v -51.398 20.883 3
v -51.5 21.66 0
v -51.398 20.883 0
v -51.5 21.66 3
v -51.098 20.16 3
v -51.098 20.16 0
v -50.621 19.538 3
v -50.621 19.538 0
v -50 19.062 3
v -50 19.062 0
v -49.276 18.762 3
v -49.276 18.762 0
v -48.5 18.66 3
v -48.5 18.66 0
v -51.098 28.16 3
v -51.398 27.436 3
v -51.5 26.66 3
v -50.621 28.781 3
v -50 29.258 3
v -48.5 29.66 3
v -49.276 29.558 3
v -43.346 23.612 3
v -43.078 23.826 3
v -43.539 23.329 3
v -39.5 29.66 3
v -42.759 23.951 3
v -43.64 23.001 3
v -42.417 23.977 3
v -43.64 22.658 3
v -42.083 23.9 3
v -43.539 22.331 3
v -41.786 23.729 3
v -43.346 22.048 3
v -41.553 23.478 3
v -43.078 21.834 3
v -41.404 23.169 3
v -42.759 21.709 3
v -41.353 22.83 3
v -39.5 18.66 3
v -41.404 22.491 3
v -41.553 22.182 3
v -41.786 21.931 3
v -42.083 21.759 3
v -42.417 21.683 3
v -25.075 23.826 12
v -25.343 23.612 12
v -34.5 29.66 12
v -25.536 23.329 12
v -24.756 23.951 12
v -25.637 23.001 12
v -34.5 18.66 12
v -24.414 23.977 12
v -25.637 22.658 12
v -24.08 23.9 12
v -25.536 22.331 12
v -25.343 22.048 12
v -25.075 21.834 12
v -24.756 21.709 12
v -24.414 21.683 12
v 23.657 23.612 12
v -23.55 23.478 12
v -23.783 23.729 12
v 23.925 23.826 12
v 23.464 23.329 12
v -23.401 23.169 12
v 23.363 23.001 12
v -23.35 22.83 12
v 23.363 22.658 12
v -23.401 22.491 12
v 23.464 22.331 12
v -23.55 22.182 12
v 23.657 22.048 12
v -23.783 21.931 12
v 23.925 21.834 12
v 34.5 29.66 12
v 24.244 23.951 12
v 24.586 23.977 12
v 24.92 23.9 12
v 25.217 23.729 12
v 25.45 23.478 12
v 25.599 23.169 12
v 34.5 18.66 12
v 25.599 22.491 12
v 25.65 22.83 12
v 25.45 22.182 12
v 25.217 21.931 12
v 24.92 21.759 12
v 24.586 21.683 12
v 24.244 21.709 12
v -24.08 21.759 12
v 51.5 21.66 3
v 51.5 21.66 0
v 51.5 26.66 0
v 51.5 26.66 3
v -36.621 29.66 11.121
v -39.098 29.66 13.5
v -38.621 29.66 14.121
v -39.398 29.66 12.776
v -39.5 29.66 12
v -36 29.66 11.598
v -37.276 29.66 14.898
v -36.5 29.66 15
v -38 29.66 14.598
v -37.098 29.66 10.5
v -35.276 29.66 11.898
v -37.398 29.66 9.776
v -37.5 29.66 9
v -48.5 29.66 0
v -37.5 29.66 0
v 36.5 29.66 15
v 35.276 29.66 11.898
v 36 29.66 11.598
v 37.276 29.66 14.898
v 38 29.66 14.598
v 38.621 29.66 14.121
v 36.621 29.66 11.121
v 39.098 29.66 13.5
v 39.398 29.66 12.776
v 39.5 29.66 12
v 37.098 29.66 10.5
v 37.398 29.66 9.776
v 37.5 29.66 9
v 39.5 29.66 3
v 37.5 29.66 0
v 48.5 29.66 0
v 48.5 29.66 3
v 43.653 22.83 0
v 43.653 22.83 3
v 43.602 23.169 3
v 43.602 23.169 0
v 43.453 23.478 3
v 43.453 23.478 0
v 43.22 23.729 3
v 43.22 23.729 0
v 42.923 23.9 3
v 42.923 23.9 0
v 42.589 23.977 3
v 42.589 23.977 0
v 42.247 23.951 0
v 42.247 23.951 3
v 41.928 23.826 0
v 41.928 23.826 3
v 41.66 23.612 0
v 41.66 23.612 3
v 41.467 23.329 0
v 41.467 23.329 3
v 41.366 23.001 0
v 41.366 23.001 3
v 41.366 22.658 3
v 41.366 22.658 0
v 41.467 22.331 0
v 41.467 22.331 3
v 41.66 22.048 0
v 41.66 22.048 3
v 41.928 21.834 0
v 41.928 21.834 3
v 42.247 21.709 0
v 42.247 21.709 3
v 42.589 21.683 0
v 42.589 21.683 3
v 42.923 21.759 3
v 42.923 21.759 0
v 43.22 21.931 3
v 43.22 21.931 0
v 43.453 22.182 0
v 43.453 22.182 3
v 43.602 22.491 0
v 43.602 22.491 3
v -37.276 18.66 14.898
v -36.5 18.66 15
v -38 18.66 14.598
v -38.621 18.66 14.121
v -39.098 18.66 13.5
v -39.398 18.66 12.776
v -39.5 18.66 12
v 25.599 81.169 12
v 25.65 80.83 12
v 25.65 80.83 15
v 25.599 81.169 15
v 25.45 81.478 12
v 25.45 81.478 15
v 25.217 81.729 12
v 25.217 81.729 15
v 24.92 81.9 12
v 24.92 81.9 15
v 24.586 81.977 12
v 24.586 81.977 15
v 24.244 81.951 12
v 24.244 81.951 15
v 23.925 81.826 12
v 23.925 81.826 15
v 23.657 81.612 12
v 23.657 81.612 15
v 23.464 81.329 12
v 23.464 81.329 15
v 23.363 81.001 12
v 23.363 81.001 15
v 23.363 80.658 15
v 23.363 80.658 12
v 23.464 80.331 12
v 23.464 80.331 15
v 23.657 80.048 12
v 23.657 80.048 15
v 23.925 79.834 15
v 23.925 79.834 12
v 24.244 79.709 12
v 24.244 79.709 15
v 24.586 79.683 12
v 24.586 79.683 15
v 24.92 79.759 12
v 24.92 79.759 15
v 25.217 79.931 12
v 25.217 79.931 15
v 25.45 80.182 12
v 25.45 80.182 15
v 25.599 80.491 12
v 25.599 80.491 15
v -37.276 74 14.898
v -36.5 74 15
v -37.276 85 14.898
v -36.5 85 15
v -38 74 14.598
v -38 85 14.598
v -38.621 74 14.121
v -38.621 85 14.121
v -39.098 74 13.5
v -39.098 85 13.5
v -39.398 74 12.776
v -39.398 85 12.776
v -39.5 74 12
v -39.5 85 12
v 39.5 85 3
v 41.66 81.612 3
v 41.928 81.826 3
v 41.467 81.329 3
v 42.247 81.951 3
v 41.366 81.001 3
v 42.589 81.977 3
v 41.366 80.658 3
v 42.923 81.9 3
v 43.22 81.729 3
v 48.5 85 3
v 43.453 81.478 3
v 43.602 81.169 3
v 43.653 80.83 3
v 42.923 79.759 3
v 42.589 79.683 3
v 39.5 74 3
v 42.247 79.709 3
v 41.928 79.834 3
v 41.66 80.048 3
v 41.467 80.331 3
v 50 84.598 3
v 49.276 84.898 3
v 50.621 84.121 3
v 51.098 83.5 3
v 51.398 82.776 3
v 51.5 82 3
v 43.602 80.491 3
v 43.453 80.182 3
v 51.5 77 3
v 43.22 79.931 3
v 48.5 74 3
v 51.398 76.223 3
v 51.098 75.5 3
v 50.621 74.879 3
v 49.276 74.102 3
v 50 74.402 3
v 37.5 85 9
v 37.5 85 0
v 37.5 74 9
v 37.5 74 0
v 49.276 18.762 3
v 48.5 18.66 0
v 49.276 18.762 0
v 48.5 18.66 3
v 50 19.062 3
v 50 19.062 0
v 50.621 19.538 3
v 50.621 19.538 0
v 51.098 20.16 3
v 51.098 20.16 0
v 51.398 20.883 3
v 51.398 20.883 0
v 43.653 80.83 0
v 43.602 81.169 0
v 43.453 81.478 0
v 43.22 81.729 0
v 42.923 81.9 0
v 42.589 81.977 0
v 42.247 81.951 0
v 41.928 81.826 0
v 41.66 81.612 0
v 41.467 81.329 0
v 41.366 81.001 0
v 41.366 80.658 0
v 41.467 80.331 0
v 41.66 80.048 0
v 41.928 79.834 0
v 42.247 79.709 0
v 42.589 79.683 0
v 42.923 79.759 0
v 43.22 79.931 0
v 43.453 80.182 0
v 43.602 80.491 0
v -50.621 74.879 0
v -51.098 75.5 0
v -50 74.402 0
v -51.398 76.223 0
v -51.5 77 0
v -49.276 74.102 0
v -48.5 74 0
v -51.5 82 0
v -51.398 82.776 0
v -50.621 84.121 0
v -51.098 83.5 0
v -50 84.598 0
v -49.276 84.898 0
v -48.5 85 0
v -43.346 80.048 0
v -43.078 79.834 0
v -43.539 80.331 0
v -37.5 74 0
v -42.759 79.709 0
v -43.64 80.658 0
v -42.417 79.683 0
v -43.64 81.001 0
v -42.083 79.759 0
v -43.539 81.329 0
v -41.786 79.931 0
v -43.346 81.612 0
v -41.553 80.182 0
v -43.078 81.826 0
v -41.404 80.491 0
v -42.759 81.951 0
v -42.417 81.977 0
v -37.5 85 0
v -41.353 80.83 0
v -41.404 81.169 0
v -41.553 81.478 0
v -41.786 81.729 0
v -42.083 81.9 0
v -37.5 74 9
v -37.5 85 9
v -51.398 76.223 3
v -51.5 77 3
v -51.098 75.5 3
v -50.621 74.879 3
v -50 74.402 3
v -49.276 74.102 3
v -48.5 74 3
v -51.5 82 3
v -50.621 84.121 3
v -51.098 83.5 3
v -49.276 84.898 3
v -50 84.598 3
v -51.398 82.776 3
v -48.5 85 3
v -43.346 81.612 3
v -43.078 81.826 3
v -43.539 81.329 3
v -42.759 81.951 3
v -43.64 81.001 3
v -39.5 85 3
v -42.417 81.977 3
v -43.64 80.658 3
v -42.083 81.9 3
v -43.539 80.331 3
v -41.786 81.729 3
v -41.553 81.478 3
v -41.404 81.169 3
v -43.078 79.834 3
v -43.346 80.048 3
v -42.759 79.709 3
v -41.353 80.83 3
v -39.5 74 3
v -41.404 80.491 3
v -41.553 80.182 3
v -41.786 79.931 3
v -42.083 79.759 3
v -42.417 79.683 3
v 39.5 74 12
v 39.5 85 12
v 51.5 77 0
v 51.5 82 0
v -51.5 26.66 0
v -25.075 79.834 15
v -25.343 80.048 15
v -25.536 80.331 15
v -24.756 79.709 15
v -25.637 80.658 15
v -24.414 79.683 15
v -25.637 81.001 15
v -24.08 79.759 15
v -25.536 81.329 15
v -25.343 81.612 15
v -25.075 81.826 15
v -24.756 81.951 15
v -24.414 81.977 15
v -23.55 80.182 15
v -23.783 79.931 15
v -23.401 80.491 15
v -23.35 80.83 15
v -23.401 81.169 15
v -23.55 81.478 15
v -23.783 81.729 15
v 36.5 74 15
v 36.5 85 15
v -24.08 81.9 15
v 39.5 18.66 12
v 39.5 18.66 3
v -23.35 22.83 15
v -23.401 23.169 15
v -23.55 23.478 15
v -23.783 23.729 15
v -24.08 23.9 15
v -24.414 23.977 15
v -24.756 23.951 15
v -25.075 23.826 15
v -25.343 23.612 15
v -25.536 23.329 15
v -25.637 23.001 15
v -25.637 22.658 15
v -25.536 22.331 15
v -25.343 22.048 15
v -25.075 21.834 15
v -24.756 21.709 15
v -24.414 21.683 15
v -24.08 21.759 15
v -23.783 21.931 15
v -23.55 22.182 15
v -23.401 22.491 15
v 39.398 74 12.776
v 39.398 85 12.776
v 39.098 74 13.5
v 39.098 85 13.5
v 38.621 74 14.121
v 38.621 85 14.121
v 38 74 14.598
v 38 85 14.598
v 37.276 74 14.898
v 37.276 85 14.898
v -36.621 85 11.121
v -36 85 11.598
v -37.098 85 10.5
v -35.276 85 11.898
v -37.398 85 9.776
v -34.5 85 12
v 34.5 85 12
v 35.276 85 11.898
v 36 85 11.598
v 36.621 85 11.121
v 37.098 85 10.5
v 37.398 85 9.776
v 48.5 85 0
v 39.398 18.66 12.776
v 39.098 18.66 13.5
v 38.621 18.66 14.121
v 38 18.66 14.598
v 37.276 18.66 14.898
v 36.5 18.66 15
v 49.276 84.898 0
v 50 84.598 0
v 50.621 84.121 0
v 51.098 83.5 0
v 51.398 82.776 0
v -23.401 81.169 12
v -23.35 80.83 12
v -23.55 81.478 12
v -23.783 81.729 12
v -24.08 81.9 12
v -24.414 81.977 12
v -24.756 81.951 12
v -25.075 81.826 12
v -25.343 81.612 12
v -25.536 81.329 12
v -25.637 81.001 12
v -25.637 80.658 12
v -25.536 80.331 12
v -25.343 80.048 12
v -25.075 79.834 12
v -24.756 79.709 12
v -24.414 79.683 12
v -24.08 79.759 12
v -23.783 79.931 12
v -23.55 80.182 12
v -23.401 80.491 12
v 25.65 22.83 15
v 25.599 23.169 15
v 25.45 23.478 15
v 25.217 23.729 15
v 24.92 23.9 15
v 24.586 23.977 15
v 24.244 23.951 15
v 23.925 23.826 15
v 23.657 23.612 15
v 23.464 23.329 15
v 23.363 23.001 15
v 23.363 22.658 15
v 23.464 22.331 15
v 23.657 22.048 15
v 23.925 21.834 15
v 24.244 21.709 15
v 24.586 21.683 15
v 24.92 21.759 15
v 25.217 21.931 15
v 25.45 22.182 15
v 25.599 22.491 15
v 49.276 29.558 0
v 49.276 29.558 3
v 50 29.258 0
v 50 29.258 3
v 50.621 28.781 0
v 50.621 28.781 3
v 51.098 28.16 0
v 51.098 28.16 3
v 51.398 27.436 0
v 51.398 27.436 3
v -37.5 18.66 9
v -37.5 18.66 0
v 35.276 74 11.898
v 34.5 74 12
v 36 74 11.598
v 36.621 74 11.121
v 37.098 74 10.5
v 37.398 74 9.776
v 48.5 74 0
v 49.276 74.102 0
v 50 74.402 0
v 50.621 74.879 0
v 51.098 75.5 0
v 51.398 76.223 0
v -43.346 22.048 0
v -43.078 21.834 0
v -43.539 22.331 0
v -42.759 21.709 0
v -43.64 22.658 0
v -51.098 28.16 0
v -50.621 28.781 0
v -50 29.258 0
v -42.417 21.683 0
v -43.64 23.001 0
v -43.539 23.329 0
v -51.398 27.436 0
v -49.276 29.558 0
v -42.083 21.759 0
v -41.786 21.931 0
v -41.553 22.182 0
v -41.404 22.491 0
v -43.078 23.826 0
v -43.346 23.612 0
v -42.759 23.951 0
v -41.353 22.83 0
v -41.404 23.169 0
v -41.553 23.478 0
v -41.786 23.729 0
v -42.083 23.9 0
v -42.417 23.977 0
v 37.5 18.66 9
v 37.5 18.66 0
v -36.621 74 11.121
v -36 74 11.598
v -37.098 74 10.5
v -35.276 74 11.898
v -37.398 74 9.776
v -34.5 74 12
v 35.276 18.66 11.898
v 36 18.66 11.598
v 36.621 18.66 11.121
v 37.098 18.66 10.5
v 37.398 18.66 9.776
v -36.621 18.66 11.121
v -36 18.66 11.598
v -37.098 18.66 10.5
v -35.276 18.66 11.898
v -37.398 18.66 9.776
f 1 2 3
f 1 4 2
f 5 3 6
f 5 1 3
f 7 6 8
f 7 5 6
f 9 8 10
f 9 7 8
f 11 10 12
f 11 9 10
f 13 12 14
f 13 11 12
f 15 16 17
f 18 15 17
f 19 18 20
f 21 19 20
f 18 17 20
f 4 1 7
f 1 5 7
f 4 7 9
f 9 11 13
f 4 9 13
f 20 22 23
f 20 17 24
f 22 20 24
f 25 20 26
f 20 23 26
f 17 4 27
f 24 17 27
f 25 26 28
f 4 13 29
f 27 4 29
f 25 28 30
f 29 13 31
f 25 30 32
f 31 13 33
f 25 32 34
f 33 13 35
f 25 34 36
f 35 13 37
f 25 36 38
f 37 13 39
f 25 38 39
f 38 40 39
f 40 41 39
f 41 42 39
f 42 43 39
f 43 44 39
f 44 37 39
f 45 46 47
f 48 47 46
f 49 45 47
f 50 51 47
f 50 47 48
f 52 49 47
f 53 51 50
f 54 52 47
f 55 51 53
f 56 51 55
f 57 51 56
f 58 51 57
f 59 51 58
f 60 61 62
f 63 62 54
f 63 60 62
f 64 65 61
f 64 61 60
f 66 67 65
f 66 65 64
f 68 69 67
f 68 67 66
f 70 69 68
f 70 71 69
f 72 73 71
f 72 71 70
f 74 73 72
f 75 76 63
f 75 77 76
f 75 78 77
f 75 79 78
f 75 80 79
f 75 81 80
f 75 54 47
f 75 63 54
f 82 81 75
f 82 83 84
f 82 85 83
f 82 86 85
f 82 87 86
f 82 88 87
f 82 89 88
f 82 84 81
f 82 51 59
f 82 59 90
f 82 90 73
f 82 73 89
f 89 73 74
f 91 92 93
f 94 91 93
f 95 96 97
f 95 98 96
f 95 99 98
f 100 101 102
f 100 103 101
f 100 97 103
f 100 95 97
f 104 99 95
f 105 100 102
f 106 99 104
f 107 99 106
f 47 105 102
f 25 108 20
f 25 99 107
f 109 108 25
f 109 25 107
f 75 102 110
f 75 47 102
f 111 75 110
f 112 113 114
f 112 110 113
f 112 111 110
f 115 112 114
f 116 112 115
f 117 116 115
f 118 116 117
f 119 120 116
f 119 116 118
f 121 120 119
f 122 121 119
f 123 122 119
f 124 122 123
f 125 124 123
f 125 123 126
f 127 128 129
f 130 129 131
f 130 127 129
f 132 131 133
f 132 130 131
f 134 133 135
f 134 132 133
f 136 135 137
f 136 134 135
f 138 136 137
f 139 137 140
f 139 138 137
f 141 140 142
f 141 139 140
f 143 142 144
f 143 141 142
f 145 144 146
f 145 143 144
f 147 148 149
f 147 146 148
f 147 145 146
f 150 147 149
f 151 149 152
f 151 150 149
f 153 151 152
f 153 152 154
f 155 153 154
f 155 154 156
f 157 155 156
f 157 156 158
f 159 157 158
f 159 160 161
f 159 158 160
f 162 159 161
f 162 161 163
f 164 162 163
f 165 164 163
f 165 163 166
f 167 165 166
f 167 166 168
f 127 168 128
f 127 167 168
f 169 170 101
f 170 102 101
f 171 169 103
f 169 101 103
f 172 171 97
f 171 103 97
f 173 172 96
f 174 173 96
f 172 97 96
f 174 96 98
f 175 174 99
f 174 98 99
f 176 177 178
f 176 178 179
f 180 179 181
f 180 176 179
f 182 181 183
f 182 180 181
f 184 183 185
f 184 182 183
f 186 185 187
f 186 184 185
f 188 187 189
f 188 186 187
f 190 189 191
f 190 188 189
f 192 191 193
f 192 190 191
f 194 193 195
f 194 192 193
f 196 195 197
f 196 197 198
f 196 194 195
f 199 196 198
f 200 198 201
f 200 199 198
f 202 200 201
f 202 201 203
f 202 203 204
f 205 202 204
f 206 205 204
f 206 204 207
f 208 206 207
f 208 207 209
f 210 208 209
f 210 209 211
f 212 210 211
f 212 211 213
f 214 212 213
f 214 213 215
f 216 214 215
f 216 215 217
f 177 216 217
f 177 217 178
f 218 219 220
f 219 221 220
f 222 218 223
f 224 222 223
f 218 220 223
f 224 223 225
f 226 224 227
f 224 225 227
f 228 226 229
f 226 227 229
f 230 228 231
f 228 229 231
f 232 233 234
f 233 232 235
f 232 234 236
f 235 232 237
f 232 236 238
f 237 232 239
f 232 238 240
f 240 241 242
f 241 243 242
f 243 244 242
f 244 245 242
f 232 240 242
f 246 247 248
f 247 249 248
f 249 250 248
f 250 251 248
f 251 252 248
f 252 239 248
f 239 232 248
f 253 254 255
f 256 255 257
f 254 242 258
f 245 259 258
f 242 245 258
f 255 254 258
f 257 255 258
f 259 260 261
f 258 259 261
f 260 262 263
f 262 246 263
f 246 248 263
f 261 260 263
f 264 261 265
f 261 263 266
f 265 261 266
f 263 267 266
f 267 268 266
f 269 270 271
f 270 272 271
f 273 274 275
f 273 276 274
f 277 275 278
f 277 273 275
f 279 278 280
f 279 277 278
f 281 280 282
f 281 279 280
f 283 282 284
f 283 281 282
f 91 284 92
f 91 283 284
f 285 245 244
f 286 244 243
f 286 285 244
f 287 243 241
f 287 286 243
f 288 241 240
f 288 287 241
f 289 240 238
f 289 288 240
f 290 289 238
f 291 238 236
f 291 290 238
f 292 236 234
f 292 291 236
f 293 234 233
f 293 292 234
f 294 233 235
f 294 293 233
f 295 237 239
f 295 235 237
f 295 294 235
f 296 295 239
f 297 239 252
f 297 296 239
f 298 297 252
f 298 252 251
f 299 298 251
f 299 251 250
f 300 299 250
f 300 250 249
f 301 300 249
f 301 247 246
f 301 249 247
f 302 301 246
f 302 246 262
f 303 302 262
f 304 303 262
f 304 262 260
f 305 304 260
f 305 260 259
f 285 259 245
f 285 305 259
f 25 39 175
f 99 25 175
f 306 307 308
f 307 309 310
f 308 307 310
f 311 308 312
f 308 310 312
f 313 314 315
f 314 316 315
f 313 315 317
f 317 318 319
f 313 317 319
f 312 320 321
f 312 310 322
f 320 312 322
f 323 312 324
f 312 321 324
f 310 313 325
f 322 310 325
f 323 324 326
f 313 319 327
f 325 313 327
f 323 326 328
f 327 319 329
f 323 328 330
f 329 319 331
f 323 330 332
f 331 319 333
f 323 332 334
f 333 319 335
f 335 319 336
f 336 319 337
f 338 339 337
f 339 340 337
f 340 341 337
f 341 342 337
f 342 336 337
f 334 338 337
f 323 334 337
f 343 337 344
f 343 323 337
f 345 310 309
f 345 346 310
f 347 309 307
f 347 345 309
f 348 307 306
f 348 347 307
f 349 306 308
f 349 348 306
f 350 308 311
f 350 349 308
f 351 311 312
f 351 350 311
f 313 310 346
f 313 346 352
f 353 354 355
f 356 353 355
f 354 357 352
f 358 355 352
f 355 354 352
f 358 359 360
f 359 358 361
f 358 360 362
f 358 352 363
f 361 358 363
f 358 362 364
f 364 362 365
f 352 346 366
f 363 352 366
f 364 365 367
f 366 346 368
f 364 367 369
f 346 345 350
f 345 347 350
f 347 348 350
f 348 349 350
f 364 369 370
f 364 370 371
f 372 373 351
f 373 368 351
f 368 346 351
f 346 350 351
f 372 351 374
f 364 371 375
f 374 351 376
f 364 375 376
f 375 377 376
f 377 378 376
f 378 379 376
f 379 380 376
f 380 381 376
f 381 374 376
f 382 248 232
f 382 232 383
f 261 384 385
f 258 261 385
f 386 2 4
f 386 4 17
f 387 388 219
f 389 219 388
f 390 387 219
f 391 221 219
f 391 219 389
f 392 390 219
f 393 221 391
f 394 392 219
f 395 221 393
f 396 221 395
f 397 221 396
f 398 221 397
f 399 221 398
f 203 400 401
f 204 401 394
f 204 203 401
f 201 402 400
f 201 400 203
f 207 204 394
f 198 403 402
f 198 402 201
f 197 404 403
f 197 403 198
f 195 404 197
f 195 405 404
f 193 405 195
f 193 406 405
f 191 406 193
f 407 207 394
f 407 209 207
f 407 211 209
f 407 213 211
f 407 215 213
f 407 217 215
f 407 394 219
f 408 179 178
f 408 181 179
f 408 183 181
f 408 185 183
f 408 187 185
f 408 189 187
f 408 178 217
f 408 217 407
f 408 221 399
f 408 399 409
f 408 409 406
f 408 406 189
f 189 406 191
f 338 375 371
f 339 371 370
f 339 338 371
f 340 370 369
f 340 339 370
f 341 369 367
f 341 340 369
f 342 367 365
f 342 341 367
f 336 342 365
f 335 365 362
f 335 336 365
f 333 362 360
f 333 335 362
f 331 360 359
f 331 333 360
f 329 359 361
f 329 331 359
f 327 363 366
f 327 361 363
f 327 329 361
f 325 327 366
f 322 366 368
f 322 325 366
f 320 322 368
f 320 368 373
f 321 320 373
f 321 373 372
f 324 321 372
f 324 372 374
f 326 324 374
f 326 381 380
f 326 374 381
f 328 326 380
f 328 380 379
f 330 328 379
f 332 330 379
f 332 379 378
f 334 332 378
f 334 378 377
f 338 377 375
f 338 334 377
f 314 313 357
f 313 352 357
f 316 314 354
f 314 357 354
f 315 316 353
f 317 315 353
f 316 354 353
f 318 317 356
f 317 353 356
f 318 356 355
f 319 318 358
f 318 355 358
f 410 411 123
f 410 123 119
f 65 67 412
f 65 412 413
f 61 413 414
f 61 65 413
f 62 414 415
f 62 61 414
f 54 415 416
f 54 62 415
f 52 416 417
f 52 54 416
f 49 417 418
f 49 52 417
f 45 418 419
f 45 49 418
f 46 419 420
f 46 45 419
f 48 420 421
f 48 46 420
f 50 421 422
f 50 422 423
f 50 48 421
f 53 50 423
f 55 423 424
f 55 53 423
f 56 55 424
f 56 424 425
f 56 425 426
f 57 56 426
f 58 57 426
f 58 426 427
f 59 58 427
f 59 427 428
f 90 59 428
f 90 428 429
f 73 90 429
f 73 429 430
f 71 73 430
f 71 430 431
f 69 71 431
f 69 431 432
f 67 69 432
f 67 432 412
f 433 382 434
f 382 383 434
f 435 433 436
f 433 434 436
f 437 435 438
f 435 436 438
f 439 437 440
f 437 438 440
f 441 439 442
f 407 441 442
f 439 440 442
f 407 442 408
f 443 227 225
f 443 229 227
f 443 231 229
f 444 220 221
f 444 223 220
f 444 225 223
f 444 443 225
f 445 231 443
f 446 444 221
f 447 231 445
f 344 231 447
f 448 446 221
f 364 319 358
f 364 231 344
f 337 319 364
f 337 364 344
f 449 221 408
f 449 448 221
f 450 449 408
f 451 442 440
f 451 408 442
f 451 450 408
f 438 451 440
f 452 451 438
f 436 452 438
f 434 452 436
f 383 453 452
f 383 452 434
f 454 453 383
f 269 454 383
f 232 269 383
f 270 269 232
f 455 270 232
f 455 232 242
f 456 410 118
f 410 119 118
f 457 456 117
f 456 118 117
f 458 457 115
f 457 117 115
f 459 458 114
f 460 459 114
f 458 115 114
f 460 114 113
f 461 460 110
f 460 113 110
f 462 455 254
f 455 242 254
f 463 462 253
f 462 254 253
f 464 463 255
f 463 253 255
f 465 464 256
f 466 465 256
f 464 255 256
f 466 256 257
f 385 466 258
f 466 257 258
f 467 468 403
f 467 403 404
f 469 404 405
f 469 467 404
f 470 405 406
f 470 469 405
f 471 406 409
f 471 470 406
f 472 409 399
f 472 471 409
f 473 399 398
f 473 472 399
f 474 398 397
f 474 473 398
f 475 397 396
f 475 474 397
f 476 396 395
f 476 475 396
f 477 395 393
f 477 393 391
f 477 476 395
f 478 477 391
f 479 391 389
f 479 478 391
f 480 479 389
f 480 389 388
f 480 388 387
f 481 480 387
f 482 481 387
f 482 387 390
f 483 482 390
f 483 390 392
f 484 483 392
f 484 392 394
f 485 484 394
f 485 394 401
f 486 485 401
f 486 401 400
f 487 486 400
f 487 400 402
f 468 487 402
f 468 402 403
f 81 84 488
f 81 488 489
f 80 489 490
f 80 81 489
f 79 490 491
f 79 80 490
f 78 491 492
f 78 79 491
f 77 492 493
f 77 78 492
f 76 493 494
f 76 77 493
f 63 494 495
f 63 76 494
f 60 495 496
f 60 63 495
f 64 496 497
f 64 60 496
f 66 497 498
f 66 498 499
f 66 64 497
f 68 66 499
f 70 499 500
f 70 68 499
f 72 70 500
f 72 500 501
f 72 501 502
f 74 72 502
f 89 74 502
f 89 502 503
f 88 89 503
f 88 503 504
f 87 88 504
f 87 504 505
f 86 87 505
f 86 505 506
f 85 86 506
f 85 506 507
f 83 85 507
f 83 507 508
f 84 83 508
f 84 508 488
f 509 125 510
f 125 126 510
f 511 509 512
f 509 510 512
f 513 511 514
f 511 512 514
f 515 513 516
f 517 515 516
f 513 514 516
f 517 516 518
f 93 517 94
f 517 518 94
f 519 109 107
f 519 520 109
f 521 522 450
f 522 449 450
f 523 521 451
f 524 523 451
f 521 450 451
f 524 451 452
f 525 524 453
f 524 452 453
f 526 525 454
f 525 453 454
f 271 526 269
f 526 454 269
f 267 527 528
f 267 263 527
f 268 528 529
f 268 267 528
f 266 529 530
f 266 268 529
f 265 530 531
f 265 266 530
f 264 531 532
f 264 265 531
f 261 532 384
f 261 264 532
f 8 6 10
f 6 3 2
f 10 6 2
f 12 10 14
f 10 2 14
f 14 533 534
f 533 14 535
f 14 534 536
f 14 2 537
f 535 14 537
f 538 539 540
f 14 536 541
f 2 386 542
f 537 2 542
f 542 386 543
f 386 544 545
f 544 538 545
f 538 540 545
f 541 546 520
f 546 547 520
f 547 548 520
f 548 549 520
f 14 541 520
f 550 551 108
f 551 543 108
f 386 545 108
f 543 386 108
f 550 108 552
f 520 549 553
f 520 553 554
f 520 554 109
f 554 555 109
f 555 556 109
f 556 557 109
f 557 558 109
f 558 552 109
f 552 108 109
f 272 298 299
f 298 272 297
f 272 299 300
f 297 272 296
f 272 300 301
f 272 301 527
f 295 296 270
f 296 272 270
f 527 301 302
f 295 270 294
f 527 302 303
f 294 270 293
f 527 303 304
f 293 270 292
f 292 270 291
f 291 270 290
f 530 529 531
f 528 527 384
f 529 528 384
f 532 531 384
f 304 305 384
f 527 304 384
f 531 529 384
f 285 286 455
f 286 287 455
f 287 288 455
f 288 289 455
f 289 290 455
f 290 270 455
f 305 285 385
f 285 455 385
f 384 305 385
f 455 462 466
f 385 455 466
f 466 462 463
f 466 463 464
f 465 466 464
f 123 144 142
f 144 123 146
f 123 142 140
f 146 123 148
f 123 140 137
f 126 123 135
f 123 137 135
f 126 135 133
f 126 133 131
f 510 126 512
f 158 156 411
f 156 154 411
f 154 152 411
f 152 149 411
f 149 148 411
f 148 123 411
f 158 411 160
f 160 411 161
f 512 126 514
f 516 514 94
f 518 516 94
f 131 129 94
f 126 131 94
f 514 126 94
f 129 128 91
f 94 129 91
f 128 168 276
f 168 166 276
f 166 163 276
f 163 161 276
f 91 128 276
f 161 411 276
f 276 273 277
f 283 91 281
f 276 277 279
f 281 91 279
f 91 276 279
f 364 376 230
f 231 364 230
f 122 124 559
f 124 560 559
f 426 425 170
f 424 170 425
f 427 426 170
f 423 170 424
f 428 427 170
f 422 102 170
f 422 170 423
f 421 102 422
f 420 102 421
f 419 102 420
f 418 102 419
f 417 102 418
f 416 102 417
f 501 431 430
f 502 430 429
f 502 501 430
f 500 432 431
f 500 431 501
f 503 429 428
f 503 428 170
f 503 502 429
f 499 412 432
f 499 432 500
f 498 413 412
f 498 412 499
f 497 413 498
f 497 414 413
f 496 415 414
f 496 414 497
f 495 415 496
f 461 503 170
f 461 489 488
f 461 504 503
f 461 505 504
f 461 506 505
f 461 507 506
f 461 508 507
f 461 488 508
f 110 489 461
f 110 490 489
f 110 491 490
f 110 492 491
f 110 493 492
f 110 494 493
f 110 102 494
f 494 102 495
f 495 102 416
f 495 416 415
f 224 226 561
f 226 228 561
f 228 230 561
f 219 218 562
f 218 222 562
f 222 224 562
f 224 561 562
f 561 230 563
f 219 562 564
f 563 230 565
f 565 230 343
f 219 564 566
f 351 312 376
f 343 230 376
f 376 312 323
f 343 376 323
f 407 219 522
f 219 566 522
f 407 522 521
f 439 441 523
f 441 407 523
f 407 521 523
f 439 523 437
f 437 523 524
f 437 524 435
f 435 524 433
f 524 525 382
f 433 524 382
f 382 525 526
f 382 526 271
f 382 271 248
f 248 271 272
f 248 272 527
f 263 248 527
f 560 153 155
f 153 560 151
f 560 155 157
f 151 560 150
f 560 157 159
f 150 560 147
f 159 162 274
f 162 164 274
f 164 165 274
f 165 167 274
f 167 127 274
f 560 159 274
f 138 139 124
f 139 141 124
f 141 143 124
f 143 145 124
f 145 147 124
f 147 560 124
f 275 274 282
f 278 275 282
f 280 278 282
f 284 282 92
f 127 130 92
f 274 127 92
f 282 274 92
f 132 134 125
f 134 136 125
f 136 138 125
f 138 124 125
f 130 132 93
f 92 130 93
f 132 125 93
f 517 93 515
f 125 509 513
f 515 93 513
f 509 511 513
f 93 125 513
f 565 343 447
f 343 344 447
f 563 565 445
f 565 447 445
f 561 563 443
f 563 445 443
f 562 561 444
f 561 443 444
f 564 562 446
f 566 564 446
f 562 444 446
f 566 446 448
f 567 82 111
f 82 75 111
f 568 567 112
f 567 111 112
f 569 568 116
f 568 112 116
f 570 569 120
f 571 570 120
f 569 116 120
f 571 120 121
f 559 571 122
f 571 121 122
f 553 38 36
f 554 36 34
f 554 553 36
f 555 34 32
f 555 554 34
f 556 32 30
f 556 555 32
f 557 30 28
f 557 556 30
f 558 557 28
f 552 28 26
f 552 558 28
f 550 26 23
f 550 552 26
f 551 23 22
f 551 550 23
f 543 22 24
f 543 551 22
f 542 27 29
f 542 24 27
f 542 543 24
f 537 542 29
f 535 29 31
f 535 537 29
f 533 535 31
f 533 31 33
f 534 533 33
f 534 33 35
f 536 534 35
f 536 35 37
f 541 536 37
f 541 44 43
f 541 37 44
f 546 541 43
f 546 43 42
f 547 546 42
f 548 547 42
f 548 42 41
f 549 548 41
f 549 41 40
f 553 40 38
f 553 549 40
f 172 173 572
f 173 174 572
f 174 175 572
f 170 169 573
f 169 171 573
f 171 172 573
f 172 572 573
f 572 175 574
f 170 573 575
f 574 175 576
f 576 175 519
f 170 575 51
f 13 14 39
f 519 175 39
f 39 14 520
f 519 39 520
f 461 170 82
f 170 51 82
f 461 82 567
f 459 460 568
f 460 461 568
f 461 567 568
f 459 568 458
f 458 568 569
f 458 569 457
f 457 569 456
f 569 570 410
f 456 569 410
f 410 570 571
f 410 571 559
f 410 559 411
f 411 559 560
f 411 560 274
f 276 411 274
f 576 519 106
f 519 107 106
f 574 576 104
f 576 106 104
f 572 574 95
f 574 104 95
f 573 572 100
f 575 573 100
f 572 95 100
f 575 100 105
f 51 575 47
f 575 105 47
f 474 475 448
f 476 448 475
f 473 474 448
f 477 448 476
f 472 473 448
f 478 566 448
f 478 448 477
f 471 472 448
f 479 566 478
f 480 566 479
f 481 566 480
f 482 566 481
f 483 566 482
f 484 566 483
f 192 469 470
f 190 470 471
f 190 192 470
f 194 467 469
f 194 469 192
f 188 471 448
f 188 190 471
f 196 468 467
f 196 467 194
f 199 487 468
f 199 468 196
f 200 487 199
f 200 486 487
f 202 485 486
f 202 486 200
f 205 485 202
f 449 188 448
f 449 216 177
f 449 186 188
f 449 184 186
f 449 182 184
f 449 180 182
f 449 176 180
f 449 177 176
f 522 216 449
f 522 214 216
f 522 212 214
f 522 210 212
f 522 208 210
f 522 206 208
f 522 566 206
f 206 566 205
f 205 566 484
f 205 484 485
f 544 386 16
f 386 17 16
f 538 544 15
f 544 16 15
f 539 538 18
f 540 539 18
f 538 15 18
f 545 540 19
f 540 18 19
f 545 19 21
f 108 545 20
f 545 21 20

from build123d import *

# Parameters (mm, degrees)
F0_W     = 103
F0_H     = 11.0001200944
F0_R     = 1.15
F1_DEPTH = 15
F2_W     = 75
F2_H     = 24
F2_W_2   = 12
F2_H_2   = 12
F3_DEPTH = 85.001
F4_R     = 3
F4_2_R   = 3


with BuildPart() as f1:
    # F0 (on Top) → F1 (new body)
    with BuildSketch(Plane.XY):
        with Locations((0, 79.4999399528)):
            Rectangle(F0_W, F0_H)
        with Locations((-42.5030402839, 80.8298799056)):
            Circle(F0_R, mode=Mode.SUBTRACT)
        with Locations((-30.75, 79.0408372581)):
            Circle(F0_R, mode=Mode.SUBTRACT)
        with Locations((-24.5, 80.8298799056)):
            Circle(F0_R, mode=Mode.SUBTRACT)
        with Locations((30.75, 79.0408372581)):
            Circle(F0_R, mode=Mode.SUBTRACT)
        with Locations((24.5, 80.8298799056)):
            Circle(F0_R, mode=Mode.SUBTRACT)
        with Locations((42.5030402839, 80.8298799056)):
            Circle(F0_R, mode=Mode.SUBTRACT)
        with Locations((-30.75, 79.0408372581)):
            Circle(F0_R)
        with Locations((30.75, 79.0408372581)):
            Circle(F0_R)
    extrude(amount=F1_DEPTH)


with BuildPart() as f1b:
    # F0 (on Top) → F1, piece 2 (new body)
    with BuildSketch(Plane.XY):
        with Locations((0, 24.1598198584)):
            Rectangle(F0_W, F0_H)
        with Locations((-42.5030402839, 22.8298799056)):
            Circle(F0_R, mode=Mode.SUBTRACT)
        with Locations((-24.5, 22.8298799056)):
            Circle(F0_R, mode=Mode.SUBTRACT)
        with Locations((24.5, 22.8298799056)):
            Circle(F0_R, mode=Mode.SUBTRACT)
        with Locations((42.5030402839, 22.8298799056)):
            Circle(F0_R, mode=Mode.SUBTRACT)
    extrude(amount=F1_DEPTH)


with BuildPart() as f3_tool:
    # F2 (on Front) → F3 (new body, through all)
    with BuildSketch(Plane.XZ):
        Rectangle(F2_W, F2_H)
        with Locations((-45.5, 9)):
            Rectangle(F2_W_2, F2_H_2)
        with Locations((45.5, 9)):
            Rectangle(F2_W_2, F2_H_2)
    extrude(amount=-F3_DEPTH)


with BuildPart() as f1_1:
    add(f1.part)

    # F3: cut by f3_tool
    add(f3_tool.part, mode=Mode.SUBTRACT)

    # F4#2
    f4_2_edges = [f1_1.edges().sort_by_distance(p)[0] for p in [
        (-37.5, 79.49994, 12),
        (-51.5, 73.99988, 1.5),
        (-51.5, 85, 1.5),
        (-39.5, 79.49994, 15),
        (39.5, 79.49994, 15),
        (51.5, 73.99988, 1.5),
        (51.5, 85, 1.5),
        (37.5, 79.49994, 12),
    ]]
    fillet(f4_2_edges, radius=F4_2_R)


with BuildPart() as f1b_1:
    add(f1b.part)

    # F3: cut by f3_tool
    add(f3_tool.part, mode=Mode.SUBTRACT)

    # F4
    f4_edges = [f1b_1.edges().sort_by_distance(p)[0] for p in [
        (-39.5, 24.15982, 15),
        (-37.5, 24.15982, 12),
        (-51.5, 18.65976, 1.5),
        (-51.5, 29.65988, 1.5),
        (39.5, 24.15982, 15),
        (51.5, 18.65976, 1.5),
        (51.5, 29.65988, 1.5),
        (37.5, 24.15982, 12),
    ]]
    fillet(f4_edges, radius=F4_R)


solid = Compound([f1_1.part, f1b_1.part])
